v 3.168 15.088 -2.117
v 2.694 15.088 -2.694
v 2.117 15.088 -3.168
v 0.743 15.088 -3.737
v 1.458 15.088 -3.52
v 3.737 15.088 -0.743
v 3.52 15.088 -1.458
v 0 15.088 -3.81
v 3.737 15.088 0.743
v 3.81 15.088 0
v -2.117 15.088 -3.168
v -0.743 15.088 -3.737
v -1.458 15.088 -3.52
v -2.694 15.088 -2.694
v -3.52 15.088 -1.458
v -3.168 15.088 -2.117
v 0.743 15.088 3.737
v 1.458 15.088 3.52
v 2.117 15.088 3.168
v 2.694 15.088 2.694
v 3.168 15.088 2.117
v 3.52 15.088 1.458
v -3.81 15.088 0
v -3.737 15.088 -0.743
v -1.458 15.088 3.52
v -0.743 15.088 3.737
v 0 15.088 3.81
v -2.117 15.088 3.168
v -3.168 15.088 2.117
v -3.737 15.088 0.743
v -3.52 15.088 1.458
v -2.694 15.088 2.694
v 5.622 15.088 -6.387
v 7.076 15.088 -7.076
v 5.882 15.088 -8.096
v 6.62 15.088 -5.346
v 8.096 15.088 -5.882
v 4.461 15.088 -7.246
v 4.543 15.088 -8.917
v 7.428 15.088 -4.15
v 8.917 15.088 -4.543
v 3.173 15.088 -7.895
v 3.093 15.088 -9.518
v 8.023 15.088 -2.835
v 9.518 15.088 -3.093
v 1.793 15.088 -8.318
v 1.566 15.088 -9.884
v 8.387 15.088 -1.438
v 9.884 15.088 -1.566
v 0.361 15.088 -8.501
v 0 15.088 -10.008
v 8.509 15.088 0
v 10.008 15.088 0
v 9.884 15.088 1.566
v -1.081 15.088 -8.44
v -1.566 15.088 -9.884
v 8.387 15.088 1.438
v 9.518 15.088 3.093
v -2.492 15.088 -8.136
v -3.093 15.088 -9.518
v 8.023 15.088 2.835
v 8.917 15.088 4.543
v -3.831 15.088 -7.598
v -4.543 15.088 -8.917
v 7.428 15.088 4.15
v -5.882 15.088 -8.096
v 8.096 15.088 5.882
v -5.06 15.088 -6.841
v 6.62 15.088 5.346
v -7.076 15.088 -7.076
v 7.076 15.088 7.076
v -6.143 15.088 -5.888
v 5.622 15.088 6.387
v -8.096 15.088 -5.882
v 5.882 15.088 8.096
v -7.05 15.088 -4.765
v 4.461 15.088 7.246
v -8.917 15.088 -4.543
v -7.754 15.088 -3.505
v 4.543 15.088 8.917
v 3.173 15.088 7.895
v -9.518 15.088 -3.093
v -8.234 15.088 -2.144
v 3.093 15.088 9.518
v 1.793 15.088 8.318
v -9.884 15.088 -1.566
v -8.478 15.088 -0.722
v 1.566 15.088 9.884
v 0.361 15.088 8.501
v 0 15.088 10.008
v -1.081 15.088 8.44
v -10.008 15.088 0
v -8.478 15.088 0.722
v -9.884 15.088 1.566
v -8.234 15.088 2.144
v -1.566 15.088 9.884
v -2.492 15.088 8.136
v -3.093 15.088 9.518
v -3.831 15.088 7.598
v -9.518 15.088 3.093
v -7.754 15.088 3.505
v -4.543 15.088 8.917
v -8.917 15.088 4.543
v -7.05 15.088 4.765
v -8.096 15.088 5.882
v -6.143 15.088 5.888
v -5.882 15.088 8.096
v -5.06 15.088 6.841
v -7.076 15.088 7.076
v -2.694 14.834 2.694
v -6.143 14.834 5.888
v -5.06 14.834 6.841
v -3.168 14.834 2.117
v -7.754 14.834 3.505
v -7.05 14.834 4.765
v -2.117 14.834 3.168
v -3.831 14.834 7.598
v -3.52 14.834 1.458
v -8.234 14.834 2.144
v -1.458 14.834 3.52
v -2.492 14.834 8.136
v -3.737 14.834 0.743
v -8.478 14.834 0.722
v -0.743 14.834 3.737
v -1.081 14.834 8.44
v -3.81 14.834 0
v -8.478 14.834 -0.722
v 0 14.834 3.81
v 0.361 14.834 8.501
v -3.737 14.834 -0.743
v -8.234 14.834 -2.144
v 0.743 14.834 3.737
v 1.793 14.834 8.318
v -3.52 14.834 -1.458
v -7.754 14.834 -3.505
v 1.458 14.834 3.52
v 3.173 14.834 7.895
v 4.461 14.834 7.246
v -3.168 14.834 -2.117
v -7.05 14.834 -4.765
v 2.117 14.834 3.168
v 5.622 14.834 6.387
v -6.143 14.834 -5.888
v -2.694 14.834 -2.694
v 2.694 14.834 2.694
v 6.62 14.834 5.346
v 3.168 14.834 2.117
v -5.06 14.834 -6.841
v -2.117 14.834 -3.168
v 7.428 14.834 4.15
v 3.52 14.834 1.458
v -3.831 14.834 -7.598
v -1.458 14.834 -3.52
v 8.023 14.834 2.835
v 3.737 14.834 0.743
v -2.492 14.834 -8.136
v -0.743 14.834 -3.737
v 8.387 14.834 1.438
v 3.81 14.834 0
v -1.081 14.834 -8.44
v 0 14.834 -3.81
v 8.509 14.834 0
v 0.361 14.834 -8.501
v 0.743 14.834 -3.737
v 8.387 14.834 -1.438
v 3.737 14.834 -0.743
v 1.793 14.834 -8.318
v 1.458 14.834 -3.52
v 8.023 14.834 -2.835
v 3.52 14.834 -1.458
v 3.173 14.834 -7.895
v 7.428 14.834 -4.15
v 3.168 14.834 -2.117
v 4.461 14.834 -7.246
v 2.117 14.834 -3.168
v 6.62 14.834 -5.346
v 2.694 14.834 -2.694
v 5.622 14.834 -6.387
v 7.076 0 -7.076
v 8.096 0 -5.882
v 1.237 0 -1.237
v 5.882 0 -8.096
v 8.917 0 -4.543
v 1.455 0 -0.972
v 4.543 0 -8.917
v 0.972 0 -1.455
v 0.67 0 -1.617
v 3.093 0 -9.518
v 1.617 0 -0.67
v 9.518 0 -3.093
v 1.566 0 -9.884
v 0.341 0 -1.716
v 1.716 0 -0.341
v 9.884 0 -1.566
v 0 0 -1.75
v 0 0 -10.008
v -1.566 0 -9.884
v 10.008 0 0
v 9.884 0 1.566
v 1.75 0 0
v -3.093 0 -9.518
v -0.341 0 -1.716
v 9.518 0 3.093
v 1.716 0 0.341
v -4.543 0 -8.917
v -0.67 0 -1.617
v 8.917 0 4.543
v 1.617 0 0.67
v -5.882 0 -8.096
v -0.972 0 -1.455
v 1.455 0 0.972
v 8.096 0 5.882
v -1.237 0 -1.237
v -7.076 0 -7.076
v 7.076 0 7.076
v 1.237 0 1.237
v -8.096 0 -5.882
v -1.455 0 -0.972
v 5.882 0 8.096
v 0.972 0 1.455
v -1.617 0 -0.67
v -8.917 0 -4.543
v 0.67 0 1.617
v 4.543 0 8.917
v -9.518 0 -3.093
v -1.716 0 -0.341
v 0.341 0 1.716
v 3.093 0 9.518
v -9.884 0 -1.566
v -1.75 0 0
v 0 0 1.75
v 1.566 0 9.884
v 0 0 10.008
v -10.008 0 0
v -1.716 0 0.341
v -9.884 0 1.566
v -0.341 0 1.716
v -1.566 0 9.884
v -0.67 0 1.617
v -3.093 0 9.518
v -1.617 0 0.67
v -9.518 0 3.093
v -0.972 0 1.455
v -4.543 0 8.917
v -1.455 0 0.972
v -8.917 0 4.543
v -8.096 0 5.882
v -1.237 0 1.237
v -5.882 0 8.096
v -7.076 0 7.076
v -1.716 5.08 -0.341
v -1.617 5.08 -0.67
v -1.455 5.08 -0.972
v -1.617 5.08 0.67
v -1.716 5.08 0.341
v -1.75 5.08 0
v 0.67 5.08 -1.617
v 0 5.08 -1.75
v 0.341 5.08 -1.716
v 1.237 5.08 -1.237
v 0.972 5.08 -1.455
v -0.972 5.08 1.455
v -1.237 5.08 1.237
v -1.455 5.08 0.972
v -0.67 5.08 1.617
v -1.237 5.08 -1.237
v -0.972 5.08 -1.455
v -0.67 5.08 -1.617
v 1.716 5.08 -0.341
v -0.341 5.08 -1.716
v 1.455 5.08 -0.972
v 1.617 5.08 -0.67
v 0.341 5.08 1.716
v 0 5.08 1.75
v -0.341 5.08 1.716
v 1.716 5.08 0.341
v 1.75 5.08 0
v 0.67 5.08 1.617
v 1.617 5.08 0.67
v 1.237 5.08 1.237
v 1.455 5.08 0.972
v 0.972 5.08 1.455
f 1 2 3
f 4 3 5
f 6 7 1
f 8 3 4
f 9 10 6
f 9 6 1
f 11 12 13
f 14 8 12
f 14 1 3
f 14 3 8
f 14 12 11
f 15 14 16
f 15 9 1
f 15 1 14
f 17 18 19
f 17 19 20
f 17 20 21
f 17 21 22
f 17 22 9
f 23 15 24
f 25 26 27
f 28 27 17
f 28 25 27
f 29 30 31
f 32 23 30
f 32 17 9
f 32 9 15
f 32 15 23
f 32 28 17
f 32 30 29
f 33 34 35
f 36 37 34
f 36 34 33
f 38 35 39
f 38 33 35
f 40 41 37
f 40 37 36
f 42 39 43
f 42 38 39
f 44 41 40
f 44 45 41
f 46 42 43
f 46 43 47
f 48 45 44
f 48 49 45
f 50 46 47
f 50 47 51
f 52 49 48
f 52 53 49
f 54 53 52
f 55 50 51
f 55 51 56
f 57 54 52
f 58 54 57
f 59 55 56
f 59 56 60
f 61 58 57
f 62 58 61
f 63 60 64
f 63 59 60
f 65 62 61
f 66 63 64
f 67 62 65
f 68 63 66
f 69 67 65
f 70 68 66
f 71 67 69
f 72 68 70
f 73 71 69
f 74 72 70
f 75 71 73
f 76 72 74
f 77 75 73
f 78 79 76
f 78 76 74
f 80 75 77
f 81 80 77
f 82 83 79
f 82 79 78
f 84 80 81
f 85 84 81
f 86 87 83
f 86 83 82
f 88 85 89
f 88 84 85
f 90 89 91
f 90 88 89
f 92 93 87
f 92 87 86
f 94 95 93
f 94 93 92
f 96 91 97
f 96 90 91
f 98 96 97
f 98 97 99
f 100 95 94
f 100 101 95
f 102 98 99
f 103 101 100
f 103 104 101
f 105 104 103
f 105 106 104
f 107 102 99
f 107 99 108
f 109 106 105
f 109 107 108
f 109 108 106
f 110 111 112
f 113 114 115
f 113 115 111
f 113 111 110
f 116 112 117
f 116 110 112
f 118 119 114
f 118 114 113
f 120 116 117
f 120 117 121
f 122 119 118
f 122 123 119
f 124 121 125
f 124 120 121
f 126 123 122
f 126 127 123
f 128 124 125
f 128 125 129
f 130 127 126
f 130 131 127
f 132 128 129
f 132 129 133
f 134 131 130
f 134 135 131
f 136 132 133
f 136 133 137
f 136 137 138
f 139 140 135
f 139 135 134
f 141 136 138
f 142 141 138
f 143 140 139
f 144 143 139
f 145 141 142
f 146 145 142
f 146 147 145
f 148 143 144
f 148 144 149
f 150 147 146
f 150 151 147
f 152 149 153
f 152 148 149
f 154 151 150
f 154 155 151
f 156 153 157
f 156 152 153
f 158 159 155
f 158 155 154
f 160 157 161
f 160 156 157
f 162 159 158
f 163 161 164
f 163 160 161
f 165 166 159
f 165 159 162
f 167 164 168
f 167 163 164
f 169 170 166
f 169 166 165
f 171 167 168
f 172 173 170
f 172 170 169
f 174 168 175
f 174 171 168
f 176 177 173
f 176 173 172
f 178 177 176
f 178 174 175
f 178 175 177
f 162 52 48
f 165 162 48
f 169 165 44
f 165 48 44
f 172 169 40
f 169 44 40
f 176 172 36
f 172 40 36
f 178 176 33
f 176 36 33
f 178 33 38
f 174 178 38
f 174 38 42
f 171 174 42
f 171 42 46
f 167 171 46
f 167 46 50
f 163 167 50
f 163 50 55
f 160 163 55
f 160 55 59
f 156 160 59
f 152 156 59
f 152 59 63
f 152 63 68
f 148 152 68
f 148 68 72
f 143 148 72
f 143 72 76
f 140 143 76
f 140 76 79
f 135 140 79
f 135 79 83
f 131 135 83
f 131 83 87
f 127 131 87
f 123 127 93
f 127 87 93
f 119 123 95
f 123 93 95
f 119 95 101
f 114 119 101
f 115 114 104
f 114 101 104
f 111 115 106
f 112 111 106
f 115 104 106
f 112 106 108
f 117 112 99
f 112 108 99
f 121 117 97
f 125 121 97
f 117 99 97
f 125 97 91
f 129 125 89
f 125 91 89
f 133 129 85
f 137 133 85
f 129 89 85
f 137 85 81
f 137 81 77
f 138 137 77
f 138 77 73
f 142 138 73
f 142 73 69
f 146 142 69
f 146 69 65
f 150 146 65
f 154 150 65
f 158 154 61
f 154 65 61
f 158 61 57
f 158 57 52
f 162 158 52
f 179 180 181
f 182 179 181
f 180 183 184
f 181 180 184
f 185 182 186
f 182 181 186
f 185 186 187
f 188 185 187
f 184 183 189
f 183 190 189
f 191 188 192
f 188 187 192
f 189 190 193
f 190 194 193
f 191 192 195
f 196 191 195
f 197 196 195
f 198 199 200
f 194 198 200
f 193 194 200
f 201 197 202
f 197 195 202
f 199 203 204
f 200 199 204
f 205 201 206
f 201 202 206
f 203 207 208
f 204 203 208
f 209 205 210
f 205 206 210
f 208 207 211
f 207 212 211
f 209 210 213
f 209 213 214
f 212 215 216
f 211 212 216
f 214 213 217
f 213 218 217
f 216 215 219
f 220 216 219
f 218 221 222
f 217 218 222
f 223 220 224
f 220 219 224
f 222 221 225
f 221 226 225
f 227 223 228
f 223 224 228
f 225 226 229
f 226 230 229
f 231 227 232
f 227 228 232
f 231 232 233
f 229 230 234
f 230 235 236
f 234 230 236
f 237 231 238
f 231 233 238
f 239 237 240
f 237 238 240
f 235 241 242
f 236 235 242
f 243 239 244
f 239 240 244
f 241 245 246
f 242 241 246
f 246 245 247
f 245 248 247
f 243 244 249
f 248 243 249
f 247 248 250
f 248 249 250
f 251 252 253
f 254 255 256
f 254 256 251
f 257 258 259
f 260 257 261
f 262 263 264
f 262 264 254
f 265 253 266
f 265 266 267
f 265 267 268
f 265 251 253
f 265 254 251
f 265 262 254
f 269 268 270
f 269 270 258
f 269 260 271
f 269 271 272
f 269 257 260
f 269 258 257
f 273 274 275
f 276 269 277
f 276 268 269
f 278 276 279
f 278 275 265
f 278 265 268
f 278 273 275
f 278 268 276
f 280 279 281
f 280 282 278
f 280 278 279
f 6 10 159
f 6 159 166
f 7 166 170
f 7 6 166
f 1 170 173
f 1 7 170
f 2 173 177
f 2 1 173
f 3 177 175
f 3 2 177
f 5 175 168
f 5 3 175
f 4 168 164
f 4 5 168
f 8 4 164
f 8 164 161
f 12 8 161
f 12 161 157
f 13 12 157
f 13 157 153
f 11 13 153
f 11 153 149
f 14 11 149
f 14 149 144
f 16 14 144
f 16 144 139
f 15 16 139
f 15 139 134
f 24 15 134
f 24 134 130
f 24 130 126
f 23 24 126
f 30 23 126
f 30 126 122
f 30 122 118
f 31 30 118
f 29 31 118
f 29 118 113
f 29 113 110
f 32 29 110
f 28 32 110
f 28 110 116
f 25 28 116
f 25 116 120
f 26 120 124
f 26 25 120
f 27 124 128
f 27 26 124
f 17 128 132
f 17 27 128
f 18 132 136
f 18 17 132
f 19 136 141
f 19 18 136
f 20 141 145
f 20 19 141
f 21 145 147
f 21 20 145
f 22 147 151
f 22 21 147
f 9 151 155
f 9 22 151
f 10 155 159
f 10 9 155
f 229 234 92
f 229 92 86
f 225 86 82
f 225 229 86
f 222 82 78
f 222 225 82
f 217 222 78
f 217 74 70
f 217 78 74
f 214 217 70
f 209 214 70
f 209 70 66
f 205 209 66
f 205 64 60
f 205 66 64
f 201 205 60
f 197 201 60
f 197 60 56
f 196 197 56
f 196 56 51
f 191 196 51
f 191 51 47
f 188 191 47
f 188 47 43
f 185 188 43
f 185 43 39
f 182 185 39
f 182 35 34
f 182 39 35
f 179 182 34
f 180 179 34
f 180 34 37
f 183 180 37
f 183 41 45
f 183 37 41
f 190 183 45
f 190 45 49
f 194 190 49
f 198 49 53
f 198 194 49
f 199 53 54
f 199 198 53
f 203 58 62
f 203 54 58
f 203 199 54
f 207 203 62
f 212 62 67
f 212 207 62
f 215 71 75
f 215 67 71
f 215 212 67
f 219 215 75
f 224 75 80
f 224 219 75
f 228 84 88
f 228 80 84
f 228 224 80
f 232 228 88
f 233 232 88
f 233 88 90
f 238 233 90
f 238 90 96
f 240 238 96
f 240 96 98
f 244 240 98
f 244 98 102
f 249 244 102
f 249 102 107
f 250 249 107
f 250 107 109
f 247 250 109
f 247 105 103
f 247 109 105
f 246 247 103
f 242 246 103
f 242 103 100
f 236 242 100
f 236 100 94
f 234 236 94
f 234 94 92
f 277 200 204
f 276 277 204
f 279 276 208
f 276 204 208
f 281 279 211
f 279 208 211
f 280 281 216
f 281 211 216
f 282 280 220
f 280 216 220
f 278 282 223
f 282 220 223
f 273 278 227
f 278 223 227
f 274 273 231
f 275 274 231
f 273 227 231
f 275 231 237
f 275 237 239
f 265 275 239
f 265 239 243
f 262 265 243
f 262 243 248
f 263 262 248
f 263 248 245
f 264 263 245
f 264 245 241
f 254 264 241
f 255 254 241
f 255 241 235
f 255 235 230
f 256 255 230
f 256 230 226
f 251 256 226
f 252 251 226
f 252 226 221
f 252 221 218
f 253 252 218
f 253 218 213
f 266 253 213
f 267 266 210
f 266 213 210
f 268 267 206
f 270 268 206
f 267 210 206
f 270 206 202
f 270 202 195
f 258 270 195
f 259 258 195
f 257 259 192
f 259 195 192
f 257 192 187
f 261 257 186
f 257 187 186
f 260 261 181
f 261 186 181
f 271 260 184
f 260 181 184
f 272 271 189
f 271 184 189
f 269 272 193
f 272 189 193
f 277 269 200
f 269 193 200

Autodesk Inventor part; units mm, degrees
ref_plane "YZ Plane" through (0, 0, 0) normal (1, 0, 0) x (0, 1, 0)
ref_plane "XZ Plane" through (0, 0, 0) normal (0, 1, 0) x (-1, 0, 0)
ref_plane "XY Plane" through (0, 0, 0) normal (0, 0, 1) x (1, 0, 0)
sketch "Sketch1" plane through (0, 0, 0) normal (0, 1, 0) x (-1, 0, 0)
  circle A0 centre (0, 0) radius 10.0076
  dimension "d0" = 20.0152
extrude "Extrusion1" add sketch "Sketch1" along normal blind 15.0876
sketch "Sketch2" plane through (0, 15.0876, 0) normal (0, 1, 0) x (1, 0, 0)
  circle A0 centre (0, 0) radius 3.81
  circle A1 centre (0, 0) radius 8.509
  dimension "d3" = 7.62
  dimension "d4" = 17.018
extrude "Extrusion2" cut sketch "Sketch2" against normal blind 0.254
sketch "Sketch3" plane through (0, 0, 0) normal (0, -1, 0) x (1, 0, 0)
  circle A0 centre (0, 0) radius 1.75
  dimension "d7" = 3.5
extrude "Extrusion3" cut sketch "Sketch3" against normal blind 5.08
thread "Thread1" size "M4x0.7" class "6H" standard "ISO Metric profile" full length
properties part number "electromagnet" material "Stainless Steel"
